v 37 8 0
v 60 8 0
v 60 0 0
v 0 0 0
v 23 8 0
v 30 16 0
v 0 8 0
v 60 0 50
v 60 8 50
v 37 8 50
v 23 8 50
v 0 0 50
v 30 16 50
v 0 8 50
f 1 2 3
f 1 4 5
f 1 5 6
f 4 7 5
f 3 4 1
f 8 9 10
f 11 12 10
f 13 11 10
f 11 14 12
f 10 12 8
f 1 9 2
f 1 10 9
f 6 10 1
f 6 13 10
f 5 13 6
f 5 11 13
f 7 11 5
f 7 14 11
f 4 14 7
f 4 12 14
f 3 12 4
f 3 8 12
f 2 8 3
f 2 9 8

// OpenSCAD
$fn = 32;

// ----------------------------------------------------------------------
// V guide rail: vrib, 60 mm wide
// ----------------------------------------------------------------------

// --- parameters (mm) ---
rail_w = 60;              // rail width, X
base_t = 8;               // base plate thickness
v_depth = 8;              // V feature depth / height
v_half_w = 7;             // half width of the V at the base face
plate_t = 50;             // rail length, Z (the extrusion height)

profile = [[0, 0], [60, 0], [60, 8], [37, 8], [30, 16], [23, 8], [0, 8]];  // primary outline, 7 points, counter clockwise

// --- the one profile operation ---
linear_extrude(height = plate_t) polygon(points = profile);
